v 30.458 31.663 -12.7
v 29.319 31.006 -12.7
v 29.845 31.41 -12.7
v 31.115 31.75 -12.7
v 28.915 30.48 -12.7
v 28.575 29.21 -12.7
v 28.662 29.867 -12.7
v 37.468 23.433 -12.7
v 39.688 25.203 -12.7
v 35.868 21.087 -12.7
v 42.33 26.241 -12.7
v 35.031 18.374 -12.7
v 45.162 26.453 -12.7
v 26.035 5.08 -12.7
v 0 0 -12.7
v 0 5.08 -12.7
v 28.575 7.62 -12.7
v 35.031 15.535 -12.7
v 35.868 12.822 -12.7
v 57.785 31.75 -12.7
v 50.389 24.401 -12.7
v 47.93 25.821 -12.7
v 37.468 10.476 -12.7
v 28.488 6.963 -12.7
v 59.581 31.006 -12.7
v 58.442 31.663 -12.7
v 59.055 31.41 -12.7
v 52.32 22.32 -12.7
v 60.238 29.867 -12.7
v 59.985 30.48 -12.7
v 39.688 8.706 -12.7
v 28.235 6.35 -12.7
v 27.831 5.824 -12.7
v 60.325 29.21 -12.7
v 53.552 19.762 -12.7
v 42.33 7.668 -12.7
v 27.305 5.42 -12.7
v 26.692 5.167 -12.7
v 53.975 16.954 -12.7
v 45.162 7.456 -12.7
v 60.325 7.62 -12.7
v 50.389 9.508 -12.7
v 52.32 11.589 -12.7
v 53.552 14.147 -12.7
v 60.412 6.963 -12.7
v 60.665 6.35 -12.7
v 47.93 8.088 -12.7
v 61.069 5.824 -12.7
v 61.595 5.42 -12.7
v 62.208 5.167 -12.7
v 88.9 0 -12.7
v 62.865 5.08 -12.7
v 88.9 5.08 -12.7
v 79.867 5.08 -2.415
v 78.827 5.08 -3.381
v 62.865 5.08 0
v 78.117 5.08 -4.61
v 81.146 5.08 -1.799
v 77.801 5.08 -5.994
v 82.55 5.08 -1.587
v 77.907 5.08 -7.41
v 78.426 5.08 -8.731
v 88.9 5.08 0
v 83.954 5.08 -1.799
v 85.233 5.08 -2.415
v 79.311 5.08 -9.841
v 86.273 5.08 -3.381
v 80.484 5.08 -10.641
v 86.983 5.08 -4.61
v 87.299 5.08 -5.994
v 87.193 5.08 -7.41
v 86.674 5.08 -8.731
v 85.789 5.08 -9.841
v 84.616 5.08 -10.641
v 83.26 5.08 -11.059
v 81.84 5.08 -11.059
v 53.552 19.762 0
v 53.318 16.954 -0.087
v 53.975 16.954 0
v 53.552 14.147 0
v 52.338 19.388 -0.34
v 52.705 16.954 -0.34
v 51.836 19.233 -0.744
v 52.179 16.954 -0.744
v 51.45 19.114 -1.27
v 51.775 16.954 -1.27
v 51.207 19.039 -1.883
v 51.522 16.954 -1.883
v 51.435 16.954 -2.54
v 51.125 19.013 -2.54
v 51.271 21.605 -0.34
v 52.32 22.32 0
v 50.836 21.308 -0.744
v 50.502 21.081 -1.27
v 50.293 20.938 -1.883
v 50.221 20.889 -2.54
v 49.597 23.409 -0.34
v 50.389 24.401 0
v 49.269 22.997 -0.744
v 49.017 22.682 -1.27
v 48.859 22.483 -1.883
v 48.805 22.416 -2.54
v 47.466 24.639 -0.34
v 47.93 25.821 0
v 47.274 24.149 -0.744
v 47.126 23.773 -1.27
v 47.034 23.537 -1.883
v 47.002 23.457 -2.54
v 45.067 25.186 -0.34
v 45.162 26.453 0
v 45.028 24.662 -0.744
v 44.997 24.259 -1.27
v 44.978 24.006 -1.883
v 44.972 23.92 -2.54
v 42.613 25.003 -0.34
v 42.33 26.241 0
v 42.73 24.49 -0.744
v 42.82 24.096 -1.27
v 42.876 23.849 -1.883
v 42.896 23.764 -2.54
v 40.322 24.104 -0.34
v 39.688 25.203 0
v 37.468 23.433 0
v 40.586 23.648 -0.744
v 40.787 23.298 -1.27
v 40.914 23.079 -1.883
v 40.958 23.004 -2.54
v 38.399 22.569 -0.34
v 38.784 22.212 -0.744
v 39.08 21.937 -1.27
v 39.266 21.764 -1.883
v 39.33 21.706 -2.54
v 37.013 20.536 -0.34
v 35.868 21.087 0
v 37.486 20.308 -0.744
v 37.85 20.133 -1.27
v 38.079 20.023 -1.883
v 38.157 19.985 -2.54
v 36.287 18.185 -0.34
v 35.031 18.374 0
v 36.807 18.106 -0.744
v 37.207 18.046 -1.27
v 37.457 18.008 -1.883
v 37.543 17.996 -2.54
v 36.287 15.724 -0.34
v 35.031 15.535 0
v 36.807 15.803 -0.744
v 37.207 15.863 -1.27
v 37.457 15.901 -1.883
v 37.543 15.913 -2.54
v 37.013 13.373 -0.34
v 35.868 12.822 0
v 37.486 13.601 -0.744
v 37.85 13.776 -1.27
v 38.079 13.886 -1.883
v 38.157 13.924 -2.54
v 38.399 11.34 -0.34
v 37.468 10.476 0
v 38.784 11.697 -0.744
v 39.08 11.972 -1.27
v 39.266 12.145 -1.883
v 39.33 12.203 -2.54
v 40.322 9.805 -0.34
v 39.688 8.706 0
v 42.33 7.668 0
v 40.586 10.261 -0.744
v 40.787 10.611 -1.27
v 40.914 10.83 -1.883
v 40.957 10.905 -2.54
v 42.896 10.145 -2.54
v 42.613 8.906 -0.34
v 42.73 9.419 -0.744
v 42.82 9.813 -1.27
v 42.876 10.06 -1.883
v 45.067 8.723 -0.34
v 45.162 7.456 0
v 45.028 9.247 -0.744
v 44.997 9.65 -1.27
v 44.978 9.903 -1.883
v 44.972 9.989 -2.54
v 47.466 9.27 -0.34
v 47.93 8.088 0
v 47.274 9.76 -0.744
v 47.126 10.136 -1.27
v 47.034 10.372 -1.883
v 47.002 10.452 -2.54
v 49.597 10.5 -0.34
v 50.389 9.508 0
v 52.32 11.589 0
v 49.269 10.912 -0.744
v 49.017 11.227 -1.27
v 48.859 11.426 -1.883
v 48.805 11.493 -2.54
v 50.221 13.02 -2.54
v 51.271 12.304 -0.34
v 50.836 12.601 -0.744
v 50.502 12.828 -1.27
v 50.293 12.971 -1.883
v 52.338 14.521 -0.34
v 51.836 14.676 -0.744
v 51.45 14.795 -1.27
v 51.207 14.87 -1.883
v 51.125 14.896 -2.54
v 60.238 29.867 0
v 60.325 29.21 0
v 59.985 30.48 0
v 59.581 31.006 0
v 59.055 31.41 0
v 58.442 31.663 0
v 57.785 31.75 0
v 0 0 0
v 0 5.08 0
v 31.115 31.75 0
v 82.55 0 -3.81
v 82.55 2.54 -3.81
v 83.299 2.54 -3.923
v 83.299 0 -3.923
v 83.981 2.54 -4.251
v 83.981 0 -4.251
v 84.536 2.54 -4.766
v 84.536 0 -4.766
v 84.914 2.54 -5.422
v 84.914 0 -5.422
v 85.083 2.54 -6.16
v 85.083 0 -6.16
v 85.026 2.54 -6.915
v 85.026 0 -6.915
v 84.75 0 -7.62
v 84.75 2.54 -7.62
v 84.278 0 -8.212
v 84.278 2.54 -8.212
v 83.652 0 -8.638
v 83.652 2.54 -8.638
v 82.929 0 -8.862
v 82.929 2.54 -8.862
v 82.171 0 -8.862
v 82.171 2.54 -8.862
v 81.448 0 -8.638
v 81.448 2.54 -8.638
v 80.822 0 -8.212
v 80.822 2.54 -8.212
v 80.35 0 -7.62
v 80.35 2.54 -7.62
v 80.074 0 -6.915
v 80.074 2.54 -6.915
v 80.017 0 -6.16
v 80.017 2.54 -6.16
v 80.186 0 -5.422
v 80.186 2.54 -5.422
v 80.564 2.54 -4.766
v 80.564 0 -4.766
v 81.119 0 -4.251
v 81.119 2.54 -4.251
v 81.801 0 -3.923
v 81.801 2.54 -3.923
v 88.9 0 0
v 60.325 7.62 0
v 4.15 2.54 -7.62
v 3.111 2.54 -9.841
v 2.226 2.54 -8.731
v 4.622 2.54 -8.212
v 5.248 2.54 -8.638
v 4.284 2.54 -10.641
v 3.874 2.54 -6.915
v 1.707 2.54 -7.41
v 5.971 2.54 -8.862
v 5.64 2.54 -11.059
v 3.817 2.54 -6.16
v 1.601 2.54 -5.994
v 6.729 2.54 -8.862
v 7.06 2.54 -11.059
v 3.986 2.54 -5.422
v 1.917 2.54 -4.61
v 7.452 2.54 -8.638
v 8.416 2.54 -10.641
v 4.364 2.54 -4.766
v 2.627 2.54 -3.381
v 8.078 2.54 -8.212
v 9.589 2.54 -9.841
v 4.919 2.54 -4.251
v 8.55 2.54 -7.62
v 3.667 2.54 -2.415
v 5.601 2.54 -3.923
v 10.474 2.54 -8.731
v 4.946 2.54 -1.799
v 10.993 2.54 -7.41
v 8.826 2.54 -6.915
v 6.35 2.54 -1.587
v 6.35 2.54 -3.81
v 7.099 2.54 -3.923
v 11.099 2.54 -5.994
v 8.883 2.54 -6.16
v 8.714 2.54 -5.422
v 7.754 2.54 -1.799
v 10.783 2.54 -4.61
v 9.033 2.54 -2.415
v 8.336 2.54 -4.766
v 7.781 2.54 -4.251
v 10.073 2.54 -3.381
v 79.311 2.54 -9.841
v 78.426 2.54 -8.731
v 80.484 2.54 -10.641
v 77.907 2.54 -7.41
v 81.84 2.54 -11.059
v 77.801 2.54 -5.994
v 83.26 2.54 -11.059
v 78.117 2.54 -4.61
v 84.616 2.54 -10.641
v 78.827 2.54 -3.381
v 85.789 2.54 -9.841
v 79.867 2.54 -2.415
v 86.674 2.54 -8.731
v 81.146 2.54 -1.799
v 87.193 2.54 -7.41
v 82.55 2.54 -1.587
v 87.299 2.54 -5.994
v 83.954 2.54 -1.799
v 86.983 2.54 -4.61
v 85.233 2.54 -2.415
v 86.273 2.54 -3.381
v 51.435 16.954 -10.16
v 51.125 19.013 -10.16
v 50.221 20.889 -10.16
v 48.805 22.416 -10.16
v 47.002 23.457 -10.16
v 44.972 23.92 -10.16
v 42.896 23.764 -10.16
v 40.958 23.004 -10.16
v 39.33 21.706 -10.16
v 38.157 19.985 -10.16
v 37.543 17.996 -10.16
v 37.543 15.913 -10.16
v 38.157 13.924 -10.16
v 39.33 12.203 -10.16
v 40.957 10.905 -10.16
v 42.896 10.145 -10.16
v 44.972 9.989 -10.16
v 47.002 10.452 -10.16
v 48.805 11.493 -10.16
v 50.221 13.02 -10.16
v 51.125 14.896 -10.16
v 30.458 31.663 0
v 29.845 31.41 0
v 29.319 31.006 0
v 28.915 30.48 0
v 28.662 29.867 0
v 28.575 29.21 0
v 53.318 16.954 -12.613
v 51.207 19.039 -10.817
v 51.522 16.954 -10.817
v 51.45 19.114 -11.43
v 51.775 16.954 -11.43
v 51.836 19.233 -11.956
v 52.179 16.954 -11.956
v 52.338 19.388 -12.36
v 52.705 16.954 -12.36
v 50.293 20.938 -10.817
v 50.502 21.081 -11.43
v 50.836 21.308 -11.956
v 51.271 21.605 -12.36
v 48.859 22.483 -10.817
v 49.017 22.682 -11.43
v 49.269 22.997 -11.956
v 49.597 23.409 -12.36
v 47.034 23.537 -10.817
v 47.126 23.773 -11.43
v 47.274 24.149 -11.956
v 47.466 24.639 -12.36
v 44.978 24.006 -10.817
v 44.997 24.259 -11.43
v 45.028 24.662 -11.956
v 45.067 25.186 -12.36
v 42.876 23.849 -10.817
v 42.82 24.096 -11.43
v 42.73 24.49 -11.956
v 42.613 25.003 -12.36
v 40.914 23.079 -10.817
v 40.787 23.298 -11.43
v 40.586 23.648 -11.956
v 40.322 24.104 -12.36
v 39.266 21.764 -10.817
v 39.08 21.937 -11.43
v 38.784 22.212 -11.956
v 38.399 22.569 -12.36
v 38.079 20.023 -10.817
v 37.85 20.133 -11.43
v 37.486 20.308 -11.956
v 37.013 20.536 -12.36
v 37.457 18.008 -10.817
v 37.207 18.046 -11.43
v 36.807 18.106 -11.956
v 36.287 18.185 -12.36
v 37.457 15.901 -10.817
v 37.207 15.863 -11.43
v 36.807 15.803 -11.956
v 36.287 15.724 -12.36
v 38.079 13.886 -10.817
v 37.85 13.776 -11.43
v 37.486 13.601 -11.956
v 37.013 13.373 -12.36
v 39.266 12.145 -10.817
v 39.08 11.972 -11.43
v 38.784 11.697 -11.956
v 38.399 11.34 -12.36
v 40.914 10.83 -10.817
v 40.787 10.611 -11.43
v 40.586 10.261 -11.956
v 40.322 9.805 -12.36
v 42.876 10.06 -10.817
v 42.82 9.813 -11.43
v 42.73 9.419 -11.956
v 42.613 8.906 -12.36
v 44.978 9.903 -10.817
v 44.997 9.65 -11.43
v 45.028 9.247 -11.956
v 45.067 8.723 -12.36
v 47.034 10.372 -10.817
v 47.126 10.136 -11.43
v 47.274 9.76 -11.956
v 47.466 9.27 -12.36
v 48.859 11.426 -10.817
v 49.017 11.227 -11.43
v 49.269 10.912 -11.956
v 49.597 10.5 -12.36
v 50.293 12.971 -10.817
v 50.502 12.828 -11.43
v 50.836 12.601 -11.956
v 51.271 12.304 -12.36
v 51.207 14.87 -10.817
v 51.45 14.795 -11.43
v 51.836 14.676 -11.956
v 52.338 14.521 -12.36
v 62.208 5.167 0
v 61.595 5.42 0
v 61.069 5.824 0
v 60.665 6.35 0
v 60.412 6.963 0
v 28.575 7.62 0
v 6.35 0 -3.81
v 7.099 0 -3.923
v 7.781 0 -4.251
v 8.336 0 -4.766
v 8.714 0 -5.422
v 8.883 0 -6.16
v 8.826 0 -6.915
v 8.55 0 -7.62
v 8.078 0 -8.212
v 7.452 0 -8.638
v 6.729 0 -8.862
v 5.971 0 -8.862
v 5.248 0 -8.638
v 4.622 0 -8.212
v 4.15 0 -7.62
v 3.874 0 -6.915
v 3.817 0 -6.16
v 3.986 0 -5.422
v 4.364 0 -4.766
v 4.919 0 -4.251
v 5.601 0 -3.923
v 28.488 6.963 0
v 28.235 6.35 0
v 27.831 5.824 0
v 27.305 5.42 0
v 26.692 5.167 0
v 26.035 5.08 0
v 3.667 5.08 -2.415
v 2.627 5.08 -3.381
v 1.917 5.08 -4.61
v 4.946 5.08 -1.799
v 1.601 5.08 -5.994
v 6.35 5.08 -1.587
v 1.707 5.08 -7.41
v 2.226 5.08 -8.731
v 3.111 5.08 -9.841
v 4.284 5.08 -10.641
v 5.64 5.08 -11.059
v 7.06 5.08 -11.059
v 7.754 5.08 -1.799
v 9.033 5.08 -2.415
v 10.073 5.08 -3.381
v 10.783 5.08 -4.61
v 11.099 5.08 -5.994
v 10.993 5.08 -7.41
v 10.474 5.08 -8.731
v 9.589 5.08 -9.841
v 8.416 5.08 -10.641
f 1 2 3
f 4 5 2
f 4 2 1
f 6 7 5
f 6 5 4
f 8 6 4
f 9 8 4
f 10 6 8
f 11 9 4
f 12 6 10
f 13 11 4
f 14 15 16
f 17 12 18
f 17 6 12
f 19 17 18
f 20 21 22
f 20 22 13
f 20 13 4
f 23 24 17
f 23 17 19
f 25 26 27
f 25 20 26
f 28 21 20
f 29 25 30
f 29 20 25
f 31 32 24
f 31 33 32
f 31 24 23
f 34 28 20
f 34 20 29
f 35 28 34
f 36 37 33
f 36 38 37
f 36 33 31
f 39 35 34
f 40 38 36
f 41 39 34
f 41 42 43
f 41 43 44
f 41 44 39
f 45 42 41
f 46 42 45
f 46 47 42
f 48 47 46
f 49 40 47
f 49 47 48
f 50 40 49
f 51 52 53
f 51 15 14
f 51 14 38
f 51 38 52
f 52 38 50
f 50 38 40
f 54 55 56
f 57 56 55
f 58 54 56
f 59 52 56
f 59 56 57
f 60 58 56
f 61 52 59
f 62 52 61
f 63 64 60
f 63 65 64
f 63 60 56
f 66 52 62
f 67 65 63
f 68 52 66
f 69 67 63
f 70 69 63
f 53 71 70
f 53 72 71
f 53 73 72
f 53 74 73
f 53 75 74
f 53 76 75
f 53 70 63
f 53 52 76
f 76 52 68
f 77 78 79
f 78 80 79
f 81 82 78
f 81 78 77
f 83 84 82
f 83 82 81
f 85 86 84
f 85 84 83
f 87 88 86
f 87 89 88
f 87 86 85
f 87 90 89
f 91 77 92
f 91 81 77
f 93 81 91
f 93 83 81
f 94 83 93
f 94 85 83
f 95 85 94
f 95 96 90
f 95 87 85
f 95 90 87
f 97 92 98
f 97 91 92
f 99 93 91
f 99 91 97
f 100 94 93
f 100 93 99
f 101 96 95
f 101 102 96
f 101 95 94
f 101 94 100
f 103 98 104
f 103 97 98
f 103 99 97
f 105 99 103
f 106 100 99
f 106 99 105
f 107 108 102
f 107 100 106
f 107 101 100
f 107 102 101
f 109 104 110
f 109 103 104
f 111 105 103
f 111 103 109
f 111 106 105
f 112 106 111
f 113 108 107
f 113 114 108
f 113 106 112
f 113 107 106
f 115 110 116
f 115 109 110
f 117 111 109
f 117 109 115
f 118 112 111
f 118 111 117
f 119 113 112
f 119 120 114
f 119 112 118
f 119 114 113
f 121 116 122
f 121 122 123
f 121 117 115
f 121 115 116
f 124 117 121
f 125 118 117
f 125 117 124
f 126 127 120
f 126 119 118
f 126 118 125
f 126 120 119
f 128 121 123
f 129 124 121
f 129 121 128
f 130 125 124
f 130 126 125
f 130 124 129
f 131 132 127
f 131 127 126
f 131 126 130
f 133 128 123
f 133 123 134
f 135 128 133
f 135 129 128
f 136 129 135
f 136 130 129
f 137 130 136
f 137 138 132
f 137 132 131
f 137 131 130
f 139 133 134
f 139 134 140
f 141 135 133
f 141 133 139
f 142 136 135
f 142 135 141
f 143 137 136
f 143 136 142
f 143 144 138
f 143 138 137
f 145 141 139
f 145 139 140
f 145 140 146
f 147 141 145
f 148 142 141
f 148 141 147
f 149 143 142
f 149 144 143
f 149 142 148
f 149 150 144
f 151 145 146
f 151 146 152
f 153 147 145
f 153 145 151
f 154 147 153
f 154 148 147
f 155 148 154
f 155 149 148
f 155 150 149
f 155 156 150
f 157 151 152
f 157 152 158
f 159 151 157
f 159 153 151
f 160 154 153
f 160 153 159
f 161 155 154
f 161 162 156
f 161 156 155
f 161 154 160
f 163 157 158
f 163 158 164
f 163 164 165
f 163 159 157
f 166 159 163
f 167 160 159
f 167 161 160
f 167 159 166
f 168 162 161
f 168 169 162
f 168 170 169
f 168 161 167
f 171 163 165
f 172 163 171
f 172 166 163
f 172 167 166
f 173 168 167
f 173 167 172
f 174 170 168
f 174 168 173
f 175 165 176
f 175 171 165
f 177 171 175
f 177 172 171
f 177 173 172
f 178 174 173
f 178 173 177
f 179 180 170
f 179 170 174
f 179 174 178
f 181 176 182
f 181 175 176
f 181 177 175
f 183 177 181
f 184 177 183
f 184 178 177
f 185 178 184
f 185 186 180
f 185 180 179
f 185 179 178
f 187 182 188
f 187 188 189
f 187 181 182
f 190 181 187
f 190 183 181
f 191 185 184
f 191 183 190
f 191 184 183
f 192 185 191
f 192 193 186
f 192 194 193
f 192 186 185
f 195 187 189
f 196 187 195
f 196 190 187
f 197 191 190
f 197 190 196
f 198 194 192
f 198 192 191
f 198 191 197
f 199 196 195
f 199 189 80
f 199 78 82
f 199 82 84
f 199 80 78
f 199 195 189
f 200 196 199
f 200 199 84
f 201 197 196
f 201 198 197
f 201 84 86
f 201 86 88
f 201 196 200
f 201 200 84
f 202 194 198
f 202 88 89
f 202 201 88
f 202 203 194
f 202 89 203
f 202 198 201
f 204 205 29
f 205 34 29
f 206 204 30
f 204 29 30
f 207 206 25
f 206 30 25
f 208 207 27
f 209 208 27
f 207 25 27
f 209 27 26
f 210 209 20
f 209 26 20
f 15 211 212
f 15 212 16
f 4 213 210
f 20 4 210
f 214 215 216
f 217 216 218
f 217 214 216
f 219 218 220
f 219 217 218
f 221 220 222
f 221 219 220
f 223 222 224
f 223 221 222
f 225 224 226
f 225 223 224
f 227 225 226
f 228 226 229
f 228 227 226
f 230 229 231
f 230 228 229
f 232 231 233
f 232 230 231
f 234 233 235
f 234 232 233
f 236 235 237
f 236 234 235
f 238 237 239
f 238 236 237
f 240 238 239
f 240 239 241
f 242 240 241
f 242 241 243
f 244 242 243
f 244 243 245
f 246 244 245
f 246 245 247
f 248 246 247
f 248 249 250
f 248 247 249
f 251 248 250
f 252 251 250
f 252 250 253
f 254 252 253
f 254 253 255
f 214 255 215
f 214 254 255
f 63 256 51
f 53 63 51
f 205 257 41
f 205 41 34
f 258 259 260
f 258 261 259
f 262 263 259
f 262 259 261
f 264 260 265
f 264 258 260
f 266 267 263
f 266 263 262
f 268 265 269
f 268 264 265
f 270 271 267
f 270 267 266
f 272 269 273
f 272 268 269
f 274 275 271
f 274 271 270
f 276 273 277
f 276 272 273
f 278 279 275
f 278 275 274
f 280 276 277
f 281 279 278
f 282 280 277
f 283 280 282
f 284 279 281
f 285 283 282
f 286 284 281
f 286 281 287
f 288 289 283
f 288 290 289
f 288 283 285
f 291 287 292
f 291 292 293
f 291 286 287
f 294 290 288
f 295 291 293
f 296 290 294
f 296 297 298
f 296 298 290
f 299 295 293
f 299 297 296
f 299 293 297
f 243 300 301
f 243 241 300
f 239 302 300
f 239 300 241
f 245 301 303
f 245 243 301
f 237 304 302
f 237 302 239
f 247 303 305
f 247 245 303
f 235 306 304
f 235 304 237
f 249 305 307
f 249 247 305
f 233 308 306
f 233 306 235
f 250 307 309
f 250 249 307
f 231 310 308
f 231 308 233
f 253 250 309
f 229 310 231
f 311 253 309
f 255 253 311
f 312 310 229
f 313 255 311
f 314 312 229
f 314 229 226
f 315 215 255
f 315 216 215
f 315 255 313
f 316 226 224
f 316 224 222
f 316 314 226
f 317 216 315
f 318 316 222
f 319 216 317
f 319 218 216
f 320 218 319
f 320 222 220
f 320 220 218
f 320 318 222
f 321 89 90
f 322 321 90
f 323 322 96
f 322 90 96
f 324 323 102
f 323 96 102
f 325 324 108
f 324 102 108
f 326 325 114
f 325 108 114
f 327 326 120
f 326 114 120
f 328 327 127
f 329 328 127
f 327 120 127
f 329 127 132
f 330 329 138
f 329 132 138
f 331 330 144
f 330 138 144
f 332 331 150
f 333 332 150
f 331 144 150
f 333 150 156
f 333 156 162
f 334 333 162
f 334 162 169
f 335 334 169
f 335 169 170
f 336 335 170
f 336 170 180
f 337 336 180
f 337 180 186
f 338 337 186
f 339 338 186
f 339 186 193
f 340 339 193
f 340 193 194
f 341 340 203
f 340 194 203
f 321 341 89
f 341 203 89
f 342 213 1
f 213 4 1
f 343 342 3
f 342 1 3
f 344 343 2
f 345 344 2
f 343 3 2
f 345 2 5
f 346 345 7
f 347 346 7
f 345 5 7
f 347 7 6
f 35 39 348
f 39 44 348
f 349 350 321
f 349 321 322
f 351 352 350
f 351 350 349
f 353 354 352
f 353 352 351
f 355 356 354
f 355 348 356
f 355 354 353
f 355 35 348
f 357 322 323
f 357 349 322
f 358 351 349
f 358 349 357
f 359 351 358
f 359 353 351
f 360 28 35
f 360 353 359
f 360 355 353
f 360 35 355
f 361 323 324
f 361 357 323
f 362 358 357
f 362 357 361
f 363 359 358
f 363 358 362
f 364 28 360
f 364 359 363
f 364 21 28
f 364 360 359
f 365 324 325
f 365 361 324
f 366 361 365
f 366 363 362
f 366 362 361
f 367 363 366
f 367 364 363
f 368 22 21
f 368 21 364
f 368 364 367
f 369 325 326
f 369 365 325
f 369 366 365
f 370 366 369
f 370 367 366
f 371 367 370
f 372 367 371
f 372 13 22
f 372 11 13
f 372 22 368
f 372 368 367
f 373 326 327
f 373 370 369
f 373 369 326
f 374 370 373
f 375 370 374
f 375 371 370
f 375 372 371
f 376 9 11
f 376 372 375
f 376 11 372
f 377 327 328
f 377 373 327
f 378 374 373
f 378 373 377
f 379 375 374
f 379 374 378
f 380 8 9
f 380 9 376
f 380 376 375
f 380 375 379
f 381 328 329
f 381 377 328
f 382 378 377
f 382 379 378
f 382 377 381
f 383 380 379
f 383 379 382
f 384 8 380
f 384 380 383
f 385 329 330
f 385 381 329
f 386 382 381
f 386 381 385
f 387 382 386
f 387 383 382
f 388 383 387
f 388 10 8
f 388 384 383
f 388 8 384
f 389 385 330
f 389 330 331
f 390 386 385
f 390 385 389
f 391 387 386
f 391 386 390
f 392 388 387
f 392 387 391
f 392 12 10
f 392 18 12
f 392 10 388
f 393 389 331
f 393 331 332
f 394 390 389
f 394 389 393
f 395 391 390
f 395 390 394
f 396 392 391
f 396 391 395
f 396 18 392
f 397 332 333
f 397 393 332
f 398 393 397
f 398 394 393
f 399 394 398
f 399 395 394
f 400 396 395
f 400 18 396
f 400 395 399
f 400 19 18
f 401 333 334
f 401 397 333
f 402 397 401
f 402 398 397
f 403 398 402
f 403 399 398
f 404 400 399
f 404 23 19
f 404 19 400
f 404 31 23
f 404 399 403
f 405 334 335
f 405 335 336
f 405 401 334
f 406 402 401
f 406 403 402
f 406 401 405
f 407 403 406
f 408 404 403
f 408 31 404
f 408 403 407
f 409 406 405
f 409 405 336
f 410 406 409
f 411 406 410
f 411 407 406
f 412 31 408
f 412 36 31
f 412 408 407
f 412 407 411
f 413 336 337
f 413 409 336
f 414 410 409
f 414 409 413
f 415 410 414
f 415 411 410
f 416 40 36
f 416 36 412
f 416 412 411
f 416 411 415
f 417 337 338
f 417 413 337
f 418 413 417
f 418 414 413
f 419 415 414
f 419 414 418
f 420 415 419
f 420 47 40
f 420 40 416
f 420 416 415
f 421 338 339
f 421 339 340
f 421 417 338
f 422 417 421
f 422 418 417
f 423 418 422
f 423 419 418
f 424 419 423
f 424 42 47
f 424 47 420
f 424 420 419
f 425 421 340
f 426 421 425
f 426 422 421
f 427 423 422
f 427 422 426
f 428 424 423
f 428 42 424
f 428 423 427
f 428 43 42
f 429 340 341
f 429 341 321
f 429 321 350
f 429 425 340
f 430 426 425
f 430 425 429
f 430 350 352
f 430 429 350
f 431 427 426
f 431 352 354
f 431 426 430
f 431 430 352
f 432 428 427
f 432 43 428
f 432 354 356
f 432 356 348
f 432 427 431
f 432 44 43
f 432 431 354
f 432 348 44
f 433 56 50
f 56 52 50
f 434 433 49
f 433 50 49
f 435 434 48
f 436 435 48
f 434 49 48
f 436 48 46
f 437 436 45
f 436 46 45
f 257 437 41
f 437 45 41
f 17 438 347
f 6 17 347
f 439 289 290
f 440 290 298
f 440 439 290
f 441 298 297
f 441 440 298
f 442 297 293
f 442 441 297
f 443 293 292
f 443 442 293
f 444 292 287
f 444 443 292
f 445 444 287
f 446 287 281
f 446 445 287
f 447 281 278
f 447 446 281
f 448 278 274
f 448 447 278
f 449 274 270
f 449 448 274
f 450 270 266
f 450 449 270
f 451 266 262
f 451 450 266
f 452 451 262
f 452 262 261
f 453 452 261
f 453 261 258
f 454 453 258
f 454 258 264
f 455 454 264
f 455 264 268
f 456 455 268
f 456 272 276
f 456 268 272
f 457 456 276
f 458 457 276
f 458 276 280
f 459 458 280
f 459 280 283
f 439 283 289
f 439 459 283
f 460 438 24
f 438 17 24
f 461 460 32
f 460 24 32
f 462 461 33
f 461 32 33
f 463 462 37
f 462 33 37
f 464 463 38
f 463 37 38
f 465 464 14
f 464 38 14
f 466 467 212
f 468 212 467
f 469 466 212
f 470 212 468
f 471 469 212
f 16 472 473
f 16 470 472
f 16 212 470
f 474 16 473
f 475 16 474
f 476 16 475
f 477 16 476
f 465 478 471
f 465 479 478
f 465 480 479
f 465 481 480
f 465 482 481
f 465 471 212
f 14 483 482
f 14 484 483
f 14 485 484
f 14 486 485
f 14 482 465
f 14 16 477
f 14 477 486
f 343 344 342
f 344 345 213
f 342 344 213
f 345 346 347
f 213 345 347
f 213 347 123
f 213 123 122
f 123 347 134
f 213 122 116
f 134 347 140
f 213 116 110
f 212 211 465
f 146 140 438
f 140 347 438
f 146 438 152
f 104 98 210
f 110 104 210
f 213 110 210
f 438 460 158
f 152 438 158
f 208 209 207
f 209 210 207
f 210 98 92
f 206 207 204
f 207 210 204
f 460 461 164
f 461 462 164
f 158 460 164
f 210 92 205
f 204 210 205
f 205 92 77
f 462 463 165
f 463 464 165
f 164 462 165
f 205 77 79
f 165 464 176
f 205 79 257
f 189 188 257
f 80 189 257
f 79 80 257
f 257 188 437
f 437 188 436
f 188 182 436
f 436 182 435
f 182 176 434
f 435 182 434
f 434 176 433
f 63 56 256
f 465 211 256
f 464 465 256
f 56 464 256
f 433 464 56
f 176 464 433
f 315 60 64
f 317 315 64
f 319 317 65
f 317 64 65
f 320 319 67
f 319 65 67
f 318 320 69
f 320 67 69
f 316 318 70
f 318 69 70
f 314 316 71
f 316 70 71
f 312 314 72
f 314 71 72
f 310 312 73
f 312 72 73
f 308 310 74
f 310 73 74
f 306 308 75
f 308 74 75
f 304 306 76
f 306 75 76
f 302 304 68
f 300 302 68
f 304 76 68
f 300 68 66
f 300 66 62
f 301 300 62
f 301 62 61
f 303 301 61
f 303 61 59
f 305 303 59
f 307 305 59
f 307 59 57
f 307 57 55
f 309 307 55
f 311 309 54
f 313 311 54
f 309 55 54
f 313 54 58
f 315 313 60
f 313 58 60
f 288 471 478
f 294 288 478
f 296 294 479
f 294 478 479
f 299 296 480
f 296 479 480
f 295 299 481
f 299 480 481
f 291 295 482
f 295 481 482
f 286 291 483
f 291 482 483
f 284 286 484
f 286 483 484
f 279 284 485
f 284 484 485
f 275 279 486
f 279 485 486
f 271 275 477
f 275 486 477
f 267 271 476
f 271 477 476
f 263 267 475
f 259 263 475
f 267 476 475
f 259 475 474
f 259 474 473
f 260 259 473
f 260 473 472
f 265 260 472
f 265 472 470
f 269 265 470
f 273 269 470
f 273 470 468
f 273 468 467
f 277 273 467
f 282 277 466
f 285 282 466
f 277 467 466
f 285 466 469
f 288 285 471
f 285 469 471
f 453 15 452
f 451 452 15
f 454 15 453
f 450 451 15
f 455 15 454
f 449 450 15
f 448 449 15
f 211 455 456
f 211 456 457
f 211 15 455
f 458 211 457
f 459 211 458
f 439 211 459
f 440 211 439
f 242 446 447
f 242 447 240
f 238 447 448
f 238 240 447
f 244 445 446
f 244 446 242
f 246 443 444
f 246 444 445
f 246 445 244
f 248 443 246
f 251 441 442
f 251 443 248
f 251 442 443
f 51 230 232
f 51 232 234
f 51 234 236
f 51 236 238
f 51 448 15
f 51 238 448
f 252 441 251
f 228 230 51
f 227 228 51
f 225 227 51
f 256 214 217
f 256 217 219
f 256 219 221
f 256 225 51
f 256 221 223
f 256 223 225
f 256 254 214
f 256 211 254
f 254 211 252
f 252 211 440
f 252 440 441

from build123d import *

# Parameters (mm, degrees)
SKETCH1_W           = 88.9
SKETCH1_H           = 12.7
SKETCH1_R           = 2.54
BOSS_EXTRUDE2_DEPTH = 5.08
SKETCH3_R           = 4.7625
CUT_EXTRUDE1_DEPTH  = 2.54
SKETCH4_W           = 31.75
SKETCH4_H           = 31.75
SKETCH4_R           = 6.985
BOSS_EXTRUDE3_DEPTH = 12.7
FILLET1_R           = 2.54


with BuildPart() as part:
    # Sketch1 → Boss-Extrude2 (new body)
    with BuildSketch(Plane(origin=(0, 0, 0), x_dir=(1, 0, 0), z_dir=(0, 1, 0))):
        with Locations((44.45, 6.35)):
            Rectangle(SKETCH1_W, SKETCH1_H)
        with Locations(Location((6.35, 6.35, 0), (0, 0, 270))):
            Circle(SKETCH1_R, mode=Mode.SUBTRACT)
        with Locations(Location((82.55, 6.35, 0), (0, 0, 270))):
            Circle(SKETCH1_R, mode=Mode.SUBTRACT)
    extrude(amount=BOSS_EXTRUDE2_DEPTH)

    # Sketch3 → Cut-Extrude1 (cut)
    with BuildSketch(Plane(origin=(0, 5.08, 0), x_dir=(1, 0, 0), z_dir=(0, 1, 0))):
        with Locations(Location((6.35, 6.35, 0), (0, 0, 270))):
            Circle(SKETCH3_R)
        with Locations(Location((82.55, 6.35, 0), (0, 0, 270))):
            Circle(SKETCH3_R)
    extrude(amount=-CUT_EXTRUDE1_DEPTH, mode=Mode.SUBTRACT)

    # Sketch4 → Boss-Extrude3 (add)
    with BuildSketch(Plane.XY):
        with Locations((44.45, 15.875)):
            Rectangle(SKETCH4_W, SKETCH4_H)
        with Locations((44.45, 16.9545)):
            Circle(SKETCH4_R, mode=Mode.SUBTRACT)
    extrude(amount=-BOSS_EXTRUDE3_DEPTH)

    # Fillet1
    fillet1_edges = [part.edges().sort_by_distance(p)[0] for p in [
        (37.465, 16.9545, -12.7),
        (60.325, 31.75, -6.35),
        (28.575, 5.08, -6.35),
        (28.575, 31.75, -6.35),
        (60.325, 5.08, -6.35),
        (37.465, 16.9545, 0),
    ]]
    fillet(fillet1_edges, radius=FILLET1_R)


solid = part.part
